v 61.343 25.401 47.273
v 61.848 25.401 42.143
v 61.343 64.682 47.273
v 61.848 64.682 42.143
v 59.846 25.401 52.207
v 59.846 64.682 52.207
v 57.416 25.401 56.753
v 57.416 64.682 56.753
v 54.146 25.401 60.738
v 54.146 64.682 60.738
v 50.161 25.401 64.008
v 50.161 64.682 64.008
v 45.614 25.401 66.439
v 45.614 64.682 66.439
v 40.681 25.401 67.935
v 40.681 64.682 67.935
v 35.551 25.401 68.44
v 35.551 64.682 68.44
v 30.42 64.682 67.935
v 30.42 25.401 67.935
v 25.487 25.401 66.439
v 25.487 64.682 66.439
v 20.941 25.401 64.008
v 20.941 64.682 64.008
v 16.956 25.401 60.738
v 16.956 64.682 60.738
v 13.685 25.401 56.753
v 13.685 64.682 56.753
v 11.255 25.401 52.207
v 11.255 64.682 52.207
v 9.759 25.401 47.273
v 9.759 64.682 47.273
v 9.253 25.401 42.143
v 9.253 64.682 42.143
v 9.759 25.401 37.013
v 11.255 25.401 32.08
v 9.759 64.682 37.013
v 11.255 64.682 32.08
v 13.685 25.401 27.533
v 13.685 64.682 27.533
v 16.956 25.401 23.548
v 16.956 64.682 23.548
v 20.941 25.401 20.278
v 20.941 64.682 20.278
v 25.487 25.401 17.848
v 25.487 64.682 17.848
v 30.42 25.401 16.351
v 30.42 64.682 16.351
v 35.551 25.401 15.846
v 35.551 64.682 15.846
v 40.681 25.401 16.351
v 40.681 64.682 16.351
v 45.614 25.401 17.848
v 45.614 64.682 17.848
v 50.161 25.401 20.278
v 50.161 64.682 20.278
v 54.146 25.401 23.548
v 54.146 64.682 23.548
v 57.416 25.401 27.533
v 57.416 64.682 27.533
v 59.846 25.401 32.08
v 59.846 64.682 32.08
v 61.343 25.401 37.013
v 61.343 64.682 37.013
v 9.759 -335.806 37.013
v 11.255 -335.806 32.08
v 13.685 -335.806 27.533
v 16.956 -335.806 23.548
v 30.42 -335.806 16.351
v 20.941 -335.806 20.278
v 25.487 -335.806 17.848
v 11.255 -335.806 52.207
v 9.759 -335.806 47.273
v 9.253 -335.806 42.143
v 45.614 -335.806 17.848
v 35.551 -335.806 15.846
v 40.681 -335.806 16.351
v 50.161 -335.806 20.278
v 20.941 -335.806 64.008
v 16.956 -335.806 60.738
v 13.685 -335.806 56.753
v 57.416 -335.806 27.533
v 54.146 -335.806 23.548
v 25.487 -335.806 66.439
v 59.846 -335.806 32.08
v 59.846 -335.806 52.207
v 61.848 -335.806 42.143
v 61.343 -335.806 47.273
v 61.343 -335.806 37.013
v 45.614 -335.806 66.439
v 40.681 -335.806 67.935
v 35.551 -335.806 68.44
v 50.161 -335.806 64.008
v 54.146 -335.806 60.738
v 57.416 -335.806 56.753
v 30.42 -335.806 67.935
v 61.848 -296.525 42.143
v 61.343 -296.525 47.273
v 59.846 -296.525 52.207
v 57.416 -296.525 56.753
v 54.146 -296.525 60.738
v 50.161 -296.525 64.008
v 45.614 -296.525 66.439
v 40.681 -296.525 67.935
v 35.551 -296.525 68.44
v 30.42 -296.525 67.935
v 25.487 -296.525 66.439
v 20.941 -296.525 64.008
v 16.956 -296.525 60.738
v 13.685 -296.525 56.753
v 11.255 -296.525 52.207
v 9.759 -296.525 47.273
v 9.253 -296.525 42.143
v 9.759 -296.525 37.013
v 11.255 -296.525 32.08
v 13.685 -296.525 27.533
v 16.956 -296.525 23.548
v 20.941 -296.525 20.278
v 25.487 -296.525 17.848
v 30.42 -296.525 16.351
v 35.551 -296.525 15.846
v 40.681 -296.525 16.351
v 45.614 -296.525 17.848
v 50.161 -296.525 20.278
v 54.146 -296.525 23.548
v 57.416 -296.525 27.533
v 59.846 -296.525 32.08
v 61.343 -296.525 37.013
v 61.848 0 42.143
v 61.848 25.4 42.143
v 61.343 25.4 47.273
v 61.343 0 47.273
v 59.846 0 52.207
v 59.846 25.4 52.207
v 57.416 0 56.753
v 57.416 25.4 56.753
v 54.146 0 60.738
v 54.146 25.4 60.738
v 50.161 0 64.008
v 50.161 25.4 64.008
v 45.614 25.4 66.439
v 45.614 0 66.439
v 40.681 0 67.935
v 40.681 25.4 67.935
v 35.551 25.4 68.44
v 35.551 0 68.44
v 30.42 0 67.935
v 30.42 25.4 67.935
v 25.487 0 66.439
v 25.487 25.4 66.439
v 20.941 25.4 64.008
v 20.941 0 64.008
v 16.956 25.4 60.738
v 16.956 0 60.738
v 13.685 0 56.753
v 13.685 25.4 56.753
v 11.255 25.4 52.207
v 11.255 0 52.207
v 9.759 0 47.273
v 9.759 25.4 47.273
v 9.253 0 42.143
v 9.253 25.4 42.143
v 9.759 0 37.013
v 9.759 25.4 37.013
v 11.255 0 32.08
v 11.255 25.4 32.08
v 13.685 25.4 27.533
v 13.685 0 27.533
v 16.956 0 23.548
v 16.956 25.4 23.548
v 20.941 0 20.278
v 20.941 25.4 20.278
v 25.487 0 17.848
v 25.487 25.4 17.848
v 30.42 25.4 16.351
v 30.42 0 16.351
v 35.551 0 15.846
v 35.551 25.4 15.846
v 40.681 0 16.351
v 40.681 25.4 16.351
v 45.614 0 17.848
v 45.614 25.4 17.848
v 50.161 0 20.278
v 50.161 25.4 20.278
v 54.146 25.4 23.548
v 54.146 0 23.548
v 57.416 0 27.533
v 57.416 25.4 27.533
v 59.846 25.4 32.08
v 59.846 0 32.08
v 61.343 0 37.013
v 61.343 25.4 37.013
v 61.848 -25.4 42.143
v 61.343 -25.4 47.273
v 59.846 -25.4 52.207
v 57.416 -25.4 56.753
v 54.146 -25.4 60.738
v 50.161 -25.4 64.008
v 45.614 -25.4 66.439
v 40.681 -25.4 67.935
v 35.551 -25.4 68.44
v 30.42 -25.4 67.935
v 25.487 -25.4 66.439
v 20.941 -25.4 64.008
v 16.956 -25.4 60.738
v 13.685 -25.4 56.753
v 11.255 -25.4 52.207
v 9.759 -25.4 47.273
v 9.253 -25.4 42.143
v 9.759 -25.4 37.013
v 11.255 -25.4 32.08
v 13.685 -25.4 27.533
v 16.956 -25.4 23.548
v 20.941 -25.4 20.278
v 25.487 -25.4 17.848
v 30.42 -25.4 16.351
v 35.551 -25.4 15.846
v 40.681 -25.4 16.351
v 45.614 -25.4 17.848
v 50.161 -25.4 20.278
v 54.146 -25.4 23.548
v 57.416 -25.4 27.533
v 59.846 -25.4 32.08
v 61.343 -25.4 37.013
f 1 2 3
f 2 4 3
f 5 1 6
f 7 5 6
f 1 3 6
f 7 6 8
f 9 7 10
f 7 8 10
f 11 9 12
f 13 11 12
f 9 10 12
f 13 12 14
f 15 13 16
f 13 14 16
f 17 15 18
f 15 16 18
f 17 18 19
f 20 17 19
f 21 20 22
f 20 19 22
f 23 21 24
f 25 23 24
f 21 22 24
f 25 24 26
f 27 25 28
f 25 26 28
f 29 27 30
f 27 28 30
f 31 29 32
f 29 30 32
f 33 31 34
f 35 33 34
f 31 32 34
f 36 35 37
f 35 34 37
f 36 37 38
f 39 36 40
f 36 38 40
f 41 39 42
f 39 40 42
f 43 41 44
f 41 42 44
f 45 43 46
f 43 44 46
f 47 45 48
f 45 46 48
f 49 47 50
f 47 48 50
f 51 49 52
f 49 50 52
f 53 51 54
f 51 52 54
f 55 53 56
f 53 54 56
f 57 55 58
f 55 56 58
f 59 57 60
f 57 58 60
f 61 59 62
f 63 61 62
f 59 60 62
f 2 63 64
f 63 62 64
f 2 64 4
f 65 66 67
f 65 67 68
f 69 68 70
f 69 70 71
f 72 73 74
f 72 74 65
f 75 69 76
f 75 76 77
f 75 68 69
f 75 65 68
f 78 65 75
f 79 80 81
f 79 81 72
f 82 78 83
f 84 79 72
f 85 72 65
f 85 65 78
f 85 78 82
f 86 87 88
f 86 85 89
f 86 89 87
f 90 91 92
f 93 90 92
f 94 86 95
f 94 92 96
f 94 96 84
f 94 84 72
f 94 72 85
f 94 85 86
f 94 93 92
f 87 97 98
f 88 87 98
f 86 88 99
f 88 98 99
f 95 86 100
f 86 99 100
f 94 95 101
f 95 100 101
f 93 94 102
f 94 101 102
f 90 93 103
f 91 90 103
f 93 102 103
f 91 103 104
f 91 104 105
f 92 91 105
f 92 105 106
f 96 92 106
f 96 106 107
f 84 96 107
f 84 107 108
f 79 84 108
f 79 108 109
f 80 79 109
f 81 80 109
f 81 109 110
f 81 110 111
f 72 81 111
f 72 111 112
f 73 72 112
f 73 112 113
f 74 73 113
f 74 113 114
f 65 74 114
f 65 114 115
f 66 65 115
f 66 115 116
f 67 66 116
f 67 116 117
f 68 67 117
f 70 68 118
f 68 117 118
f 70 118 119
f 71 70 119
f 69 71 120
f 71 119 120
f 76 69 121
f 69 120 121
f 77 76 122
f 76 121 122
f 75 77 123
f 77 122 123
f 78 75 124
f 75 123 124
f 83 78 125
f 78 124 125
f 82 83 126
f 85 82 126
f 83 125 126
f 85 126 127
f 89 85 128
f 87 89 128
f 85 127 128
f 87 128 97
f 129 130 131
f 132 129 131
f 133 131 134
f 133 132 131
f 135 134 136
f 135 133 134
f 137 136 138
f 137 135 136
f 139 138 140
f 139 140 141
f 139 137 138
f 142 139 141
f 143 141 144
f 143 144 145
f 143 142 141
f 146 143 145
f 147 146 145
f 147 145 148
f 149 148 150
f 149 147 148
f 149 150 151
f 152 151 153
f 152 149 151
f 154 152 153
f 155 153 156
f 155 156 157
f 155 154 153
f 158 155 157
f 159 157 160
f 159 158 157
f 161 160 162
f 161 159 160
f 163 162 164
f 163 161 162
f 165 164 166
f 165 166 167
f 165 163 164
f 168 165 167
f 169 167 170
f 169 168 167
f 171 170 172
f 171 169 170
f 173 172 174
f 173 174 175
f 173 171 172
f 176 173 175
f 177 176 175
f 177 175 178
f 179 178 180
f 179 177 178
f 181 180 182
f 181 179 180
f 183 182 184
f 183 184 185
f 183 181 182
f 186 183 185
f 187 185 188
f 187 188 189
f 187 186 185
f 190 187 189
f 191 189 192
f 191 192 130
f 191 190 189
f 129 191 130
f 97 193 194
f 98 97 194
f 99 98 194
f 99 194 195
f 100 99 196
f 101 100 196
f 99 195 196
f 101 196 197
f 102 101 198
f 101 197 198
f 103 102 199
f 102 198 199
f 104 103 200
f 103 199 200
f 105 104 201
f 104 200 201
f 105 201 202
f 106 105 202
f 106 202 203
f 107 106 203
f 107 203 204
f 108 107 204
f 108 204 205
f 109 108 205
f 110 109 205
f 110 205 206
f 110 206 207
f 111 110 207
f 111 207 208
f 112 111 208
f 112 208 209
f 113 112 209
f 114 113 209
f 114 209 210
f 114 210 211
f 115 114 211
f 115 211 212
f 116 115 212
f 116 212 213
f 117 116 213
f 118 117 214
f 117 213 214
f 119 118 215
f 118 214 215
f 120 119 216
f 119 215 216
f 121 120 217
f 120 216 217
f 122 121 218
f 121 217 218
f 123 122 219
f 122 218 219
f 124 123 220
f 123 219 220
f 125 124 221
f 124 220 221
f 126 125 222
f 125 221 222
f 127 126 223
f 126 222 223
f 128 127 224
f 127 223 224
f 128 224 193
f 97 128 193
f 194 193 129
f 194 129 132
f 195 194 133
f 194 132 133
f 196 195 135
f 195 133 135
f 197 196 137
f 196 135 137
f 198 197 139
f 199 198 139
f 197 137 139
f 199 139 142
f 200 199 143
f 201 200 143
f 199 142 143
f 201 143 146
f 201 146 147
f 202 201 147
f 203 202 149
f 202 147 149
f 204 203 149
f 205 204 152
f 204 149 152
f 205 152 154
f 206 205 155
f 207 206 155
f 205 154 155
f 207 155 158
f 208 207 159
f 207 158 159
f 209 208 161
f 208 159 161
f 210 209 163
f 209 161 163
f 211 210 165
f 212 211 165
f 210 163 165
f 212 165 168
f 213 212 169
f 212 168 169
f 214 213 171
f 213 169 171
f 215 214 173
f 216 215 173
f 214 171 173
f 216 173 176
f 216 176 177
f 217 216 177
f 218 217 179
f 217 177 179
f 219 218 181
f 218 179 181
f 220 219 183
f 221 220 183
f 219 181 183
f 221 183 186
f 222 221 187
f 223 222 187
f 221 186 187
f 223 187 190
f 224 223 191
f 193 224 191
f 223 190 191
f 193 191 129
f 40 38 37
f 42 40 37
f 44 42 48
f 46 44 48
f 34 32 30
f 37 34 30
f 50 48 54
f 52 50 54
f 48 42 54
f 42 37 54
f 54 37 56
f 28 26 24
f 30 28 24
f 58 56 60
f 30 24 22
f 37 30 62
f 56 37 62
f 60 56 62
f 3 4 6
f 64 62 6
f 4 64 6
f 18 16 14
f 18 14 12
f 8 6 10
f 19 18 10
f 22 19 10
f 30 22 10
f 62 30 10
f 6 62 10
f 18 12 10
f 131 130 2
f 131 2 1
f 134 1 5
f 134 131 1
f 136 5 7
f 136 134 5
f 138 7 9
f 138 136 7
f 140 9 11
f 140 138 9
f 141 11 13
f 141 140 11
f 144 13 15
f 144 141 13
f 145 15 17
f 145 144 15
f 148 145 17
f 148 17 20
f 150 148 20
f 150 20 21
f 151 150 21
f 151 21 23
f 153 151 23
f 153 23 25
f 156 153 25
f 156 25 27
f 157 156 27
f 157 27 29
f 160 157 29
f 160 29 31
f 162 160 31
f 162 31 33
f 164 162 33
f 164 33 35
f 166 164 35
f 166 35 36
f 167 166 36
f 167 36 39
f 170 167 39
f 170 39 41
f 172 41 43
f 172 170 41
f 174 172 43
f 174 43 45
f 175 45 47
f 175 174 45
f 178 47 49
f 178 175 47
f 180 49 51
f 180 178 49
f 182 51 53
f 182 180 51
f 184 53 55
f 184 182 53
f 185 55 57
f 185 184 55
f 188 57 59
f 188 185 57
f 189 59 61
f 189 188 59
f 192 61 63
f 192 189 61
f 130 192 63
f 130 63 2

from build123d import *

# Parameters (mm, degrees)
F0_R          = 26.2972038965
F0_R_2        = 21.7596703079
F1_DEPTH      = 25.4
F2_DEPTH      = 25.4
F3_DEPTH      = 50.801
F3_DEPTH_BACK = 310.4061427


# Not quite as in the source:
# - an extrude ends at something that could not be found from the text; its depth is read off the source's solid
# - a feature of the source that left no trace in its solid (it failed there, or was rolled back) is left out
# - a pattern or mirror of a feature is missing from the dataset's text; its kind, count and spacing are read off the source's solid


with BuildPart() as f1:
    # F0 (on Front) → F1 (new body)
    with BuildSketch(Plane.XZ):
        with Locations((35.550635308, 42.1431325376)):
            Circle(F0_R)
        with Locations((35.550635308, 42.1431325376)):
            Circle(F0_R_2, mode=Mode.SUBTRACT)
        with Locations((35.550635308, 42.1431325376)):
            Circle(F0_R_2)
    extrude(amount=-F1_DEPTH)

    # F2 (add): a face of the model
    f2_faces = [f1.faces().sort_by_distance(p)[0] for p in [
        (35.550635308, 0, 42.1431325376),
    ]]
    extrude(f2_faces, amount=F2_DEPTH)

    # F3 (add, two sides): a face of the model
    f3_faces = [f1.faces().sort_by_distance(p)[0] for p in [
        (35.550635308, -25.4, 42.1431325376),
    ]]
    f3 = extrude(f3_faces, amount=-F3_DEPTH) + extrude(f3_faces, amount=F3_DEPTH_BACK)

    # F3_copies: F3 across plane
    add(f3.mirror(Plane.ZX.offset(-135.562021)))


solid = f1.part
